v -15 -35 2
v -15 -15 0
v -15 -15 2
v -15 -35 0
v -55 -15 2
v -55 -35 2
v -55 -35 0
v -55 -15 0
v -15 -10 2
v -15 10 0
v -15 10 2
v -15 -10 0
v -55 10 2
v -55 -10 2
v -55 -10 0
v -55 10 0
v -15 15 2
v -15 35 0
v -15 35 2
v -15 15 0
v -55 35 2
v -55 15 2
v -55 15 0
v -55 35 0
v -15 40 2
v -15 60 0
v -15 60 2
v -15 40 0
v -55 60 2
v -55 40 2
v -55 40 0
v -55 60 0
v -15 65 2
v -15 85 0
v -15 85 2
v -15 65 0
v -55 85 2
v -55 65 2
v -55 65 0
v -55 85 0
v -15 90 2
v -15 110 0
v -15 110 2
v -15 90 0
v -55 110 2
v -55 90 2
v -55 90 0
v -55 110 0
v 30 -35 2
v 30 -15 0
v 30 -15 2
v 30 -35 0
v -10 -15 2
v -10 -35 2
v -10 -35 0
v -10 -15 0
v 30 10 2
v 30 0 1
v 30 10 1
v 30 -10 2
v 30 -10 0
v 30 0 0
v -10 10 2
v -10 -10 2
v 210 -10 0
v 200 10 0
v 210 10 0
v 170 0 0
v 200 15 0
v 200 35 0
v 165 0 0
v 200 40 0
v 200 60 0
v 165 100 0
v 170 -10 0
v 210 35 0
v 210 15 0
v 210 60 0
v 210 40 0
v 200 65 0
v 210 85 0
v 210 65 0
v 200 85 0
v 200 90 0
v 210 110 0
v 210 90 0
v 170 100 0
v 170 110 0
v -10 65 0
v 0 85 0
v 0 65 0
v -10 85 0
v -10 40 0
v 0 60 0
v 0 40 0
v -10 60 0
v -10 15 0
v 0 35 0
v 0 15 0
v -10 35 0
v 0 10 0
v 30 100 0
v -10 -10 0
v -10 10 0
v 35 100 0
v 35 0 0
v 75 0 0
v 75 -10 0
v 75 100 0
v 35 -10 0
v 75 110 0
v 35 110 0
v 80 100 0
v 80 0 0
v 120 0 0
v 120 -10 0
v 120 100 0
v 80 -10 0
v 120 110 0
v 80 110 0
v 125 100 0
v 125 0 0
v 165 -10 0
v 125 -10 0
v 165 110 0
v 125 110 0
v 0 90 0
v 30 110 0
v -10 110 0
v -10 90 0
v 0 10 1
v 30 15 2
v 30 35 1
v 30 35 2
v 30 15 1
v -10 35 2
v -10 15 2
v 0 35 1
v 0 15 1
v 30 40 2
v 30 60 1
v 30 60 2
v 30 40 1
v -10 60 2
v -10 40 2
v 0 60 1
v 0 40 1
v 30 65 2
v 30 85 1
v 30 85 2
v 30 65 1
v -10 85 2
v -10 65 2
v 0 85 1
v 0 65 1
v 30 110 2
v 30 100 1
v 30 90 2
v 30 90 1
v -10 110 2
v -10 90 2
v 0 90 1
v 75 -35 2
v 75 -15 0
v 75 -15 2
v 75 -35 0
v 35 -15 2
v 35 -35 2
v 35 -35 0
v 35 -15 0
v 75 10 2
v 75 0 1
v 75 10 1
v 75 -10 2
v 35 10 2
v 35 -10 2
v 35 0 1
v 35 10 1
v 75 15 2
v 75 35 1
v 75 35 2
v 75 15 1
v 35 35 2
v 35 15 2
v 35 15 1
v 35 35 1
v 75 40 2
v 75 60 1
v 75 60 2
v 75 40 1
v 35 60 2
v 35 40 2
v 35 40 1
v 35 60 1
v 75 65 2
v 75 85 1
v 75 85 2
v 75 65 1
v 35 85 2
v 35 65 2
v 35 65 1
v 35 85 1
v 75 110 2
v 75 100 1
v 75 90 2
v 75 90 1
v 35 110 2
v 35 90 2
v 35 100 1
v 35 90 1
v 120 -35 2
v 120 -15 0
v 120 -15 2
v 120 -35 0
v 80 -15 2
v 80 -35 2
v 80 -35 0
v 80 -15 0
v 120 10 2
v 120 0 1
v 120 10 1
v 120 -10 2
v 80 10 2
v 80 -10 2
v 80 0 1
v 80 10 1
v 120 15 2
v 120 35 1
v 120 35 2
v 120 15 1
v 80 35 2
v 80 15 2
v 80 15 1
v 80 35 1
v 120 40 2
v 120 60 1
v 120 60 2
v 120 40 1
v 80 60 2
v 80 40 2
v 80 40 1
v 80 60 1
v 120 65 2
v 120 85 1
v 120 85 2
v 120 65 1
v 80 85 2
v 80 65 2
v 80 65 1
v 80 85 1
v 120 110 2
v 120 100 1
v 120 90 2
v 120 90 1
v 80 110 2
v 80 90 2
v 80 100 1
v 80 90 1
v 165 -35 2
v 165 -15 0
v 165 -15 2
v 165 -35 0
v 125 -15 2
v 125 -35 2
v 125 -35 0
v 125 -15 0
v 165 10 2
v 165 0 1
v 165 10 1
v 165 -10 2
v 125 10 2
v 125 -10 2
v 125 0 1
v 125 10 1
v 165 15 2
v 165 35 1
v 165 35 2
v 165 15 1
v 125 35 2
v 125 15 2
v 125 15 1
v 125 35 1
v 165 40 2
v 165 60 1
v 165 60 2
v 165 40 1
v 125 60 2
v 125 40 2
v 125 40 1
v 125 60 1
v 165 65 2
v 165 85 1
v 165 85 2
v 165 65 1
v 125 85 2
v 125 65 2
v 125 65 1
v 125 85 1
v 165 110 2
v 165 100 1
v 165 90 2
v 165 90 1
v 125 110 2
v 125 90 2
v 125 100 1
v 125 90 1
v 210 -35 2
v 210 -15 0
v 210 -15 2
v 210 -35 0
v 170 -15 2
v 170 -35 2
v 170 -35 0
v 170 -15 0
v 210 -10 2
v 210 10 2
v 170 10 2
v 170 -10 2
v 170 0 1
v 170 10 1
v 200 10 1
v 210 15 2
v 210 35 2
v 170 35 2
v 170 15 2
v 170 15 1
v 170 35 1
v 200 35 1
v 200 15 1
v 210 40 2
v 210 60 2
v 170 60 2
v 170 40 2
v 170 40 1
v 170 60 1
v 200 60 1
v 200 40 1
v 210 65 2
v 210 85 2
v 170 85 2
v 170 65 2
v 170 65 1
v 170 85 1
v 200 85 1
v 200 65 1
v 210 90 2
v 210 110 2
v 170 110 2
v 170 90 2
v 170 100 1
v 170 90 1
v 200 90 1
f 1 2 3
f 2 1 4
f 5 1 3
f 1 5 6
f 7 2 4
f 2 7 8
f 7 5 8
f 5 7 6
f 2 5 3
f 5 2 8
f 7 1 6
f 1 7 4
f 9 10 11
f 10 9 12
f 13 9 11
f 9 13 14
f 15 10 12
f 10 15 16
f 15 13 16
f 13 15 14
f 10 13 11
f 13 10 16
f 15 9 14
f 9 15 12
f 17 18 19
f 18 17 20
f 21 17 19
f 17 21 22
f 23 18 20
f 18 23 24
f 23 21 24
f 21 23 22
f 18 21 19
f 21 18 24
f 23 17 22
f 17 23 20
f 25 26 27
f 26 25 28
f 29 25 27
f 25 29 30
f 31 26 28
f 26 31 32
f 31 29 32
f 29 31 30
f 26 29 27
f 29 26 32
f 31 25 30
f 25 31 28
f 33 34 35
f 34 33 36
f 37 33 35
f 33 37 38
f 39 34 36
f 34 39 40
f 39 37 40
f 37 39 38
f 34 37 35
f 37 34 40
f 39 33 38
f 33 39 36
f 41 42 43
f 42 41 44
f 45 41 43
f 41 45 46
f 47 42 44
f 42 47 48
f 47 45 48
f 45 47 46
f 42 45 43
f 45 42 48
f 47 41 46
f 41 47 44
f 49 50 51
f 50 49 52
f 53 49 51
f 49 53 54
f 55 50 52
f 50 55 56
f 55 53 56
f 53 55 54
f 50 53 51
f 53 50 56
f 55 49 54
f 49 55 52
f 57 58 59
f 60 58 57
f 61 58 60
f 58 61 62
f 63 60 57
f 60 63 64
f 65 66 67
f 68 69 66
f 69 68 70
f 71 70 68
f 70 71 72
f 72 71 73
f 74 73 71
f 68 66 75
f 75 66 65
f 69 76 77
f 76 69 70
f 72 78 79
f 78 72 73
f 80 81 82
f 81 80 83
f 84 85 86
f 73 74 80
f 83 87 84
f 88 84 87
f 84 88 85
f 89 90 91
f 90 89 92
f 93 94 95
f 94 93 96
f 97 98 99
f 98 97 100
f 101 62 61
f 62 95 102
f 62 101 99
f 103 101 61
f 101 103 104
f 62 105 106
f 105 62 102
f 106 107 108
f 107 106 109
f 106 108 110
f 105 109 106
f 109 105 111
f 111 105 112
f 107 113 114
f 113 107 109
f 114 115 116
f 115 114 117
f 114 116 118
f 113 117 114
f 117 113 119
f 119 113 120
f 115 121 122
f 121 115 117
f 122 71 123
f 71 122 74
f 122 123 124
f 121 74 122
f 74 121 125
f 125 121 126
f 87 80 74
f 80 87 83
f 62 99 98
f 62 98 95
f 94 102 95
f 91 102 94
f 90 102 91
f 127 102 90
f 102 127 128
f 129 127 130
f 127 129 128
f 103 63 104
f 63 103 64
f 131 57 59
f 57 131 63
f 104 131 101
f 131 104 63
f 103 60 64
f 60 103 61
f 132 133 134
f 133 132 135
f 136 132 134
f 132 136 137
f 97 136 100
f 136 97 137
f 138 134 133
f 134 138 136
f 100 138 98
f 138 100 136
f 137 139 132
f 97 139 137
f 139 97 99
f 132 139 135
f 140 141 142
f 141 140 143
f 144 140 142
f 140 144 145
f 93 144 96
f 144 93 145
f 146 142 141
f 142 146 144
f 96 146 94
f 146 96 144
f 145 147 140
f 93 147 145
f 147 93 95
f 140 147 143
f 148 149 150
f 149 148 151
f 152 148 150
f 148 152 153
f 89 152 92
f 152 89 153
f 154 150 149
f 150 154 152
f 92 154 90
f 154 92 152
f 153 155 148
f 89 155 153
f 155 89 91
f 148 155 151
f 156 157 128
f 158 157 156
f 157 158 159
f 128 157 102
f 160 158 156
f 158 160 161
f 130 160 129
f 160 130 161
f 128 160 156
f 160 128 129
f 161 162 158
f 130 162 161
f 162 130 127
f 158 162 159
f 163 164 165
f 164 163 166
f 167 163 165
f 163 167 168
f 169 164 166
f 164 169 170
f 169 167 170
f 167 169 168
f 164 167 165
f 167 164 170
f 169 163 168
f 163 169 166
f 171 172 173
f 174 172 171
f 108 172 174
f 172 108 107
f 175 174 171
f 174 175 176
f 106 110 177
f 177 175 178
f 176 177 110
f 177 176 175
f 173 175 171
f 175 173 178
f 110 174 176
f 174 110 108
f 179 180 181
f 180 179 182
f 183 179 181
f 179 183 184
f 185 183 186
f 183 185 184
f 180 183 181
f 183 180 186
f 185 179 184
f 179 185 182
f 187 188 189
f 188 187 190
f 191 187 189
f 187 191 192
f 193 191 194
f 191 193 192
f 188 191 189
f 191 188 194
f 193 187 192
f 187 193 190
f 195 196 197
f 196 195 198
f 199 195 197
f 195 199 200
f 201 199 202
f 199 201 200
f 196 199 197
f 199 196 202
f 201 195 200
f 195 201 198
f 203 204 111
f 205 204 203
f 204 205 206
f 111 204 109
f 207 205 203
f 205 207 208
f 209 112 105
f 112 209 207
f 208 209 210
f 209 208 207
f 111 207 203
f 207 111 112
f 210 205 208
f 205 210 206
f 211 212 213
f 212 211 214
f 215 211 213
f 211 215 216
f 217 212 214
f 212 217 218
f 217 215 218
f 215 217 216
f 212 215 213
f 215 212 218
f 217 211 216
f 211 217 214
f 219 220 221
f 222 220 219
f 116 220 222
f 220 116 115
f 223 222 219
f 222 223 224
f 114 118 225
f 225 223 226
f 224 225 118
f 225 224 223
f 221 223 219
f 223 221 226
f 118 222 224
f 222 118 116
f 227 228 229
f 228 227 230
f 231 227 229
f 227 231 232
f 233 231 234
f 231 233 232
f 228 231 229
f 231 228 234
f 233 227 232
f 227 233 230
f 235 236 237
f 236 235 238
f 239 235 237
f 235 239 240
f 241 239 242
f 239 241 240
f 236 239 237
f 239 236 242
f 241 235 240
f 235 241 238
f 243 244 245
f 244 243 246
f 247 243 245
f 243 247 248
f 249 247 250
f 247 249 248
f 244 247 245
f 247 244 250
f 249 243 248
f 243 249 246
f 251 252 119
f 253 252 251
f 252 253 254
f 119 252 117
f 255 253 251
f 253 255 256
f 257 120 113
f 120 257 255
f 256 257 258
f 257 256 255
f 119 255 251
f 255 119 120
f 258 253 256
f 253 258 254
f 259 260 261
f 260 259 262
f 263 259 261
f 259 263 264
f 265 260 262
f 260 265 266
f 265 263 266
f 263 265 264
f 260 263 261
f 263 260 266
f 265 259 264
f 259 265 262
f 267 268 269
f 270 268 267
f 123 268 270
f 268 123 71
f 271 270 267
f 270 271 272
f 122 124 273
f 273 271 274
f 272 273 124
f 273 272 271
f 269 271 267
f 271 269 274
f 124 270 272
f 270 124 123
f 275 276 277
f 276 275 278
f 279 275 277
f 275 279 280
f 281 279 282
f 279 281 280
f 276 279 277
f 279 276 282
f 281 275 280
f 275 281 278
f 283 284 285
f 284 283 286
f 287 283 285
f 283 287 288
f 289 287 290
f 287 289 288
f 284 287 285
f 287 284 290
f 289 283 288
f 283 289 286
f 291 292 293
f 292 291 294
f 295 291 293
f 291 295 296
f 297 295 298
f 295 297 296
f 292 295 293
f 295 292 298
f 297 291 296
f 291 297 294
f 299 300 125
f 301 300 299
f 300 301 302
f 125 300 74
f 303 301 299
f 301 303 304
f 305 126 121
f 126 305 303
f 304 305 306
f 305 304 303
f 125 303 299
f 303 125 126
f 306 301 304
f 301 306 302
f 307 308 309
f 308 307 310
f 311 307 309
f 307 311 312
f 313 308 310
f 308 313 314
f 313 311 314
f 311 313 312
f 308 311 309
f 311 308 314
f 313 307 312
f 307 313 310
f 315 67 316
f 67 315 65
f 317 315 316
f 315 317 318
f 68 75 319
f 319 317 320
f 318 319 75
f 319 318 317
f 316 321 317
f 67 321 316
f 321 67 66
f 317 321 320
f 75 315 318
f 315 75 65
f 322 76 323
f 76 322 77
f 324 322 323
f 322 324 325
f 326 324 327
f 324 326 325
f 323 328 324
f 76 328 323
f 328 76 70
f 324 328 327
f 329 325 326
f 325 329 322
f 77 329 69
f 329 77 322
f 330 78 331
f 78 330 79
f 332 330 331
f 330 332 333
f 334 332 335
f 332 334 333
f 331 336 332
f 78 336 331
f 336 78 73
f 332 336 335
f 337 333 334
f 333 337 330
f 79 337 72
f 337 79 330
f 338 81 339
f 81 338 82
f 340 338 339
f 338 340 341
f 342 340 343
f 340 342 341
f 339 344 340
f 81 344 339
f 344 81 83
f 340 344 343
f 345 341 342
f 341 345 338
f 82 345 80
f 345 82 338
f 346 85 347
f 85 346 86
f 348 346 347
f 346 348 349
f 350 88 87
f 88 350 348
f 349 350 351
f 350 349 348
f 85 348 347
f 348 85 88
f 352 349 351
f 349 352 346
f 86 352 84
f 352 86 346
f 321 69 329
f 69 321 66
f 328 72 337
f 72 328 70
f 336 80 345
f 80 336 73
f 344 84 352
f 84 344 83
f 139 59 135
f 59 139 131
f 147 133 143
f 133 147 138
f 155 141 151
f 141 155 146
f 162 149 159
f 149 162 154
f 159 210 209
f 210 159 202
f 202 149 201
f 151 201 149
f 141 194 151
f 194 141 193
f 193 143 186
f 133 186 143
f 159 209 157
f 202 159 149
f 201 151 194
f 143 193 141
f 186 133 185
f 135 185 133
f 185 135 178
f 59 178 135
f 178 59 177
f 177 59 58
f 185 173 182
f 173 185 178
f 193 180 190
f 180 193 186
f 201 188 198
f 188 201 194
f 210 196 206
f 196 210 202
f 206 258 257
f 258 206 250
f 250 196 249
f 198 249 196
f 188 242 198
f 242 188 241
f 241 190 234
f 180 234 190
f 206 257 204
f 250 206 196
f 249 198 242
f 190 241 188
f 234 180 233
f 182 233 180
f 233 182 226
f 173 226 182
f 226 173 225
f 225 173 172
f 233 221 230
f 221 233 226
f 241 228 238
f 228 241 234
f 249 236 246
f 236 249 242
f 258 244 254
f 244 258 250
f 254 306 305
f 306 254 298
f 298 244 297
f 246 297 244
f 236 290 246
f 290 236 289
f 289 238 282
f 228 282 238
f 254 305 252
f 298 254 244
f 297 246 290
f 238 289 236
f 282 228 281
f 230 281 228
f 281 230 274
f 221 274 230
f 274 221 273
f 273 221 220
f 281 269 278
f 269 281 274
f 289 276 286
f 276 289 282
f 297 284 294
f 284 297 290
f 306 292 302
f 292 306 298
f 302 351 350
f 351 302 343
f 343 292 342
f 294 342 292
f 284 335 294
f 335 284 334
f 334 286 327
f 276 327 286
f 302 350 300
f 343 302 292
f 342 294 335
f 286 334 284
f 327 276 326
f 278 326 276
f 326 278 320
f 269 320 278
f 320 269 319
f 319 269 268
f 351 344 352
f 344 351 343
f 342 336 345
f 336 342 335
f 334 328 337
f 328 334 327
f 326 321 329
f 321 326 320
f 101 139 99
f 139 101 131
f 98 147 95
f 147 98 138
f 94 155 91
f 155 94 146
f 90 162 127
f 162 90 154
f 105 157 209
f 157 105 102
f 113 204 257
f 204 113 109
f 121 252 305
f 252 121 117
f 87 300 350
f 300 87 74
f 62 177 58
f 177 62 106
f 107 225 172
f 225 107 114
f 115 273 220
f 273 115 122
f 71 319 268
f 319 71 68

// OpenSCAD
// Input parameters
gap_size = 5;

wall_width = 200;   // Width of the wall
wall_height = 100;  // Height of the wall
tile_width = 40 + gap_size;    // Width of each tile
tile_height = 20 + gap_size;   // Height of each tile
//
//// Function to create a tile
module tile(x,y) {
    
    translate([x+(gap_size/2) , y+(gap_size/2) , 0])
    
    cube([tile_width-gap_size, tile_height-gap_size, 2]); // 1 unit thickness for the tile
    
    //translate([x,y, 0])
    
    //cube([tile_width, tile_height, 2]); // 1 unit thickness for the tile

}
//
//// Calculate the number of tiles needed
num_tiles_x = floor(wall_width / tile_width); // Number of tiles in X direction
num_tiles_y = floor(wall_height / tile_height); // Number of tiles in Y direction
//
//// Calculate the total dimensions of the tiled area
//total_width = num_tiles_x * tile_width;
//total_height = num_tiles_y * tile_height;
//
//// Calculate the starting position to center the tiles on the wall
//start_x = (wall_width - tile_width) /2 ;
//start_y = (wall_height - tile_height) / 2 ;
//
//// Create the wall with centered tiles
//translate([start_x, start_y, 0]) {
//    //for (x = [0 : num_tiles_x - 1]) {
//     //   for (y = [0 : num_tiles_y - 1]) {
//                tile( tile_width, tile_height);
//      //  }
//   // }
//}


tx = ceil(num_tiles_x/2);
ty = ceil(num_tiles_y/2);


color("gray")
cube([wall_width, wall_height,1]);

start_x = (wall_width - tile_width) /2 ;
start_y = (wall_height - tile_height) / 2 ;
//translate([start_x,start_y,0])

offset_x = 0;//tile_width/2 ;
offset_y = 0;


for (x = [-tx-1 :1: tx]) {
    for (y = [-ty-1 :1: ty]) {
        ox = offset_x + start_x + x * tile_width;
        oy = offset_y + start_y + y * tile_height;
        tile(ox, oy);
    }
}


// put a tile in the middle , start_x_y .. then twice for [- ... +]
